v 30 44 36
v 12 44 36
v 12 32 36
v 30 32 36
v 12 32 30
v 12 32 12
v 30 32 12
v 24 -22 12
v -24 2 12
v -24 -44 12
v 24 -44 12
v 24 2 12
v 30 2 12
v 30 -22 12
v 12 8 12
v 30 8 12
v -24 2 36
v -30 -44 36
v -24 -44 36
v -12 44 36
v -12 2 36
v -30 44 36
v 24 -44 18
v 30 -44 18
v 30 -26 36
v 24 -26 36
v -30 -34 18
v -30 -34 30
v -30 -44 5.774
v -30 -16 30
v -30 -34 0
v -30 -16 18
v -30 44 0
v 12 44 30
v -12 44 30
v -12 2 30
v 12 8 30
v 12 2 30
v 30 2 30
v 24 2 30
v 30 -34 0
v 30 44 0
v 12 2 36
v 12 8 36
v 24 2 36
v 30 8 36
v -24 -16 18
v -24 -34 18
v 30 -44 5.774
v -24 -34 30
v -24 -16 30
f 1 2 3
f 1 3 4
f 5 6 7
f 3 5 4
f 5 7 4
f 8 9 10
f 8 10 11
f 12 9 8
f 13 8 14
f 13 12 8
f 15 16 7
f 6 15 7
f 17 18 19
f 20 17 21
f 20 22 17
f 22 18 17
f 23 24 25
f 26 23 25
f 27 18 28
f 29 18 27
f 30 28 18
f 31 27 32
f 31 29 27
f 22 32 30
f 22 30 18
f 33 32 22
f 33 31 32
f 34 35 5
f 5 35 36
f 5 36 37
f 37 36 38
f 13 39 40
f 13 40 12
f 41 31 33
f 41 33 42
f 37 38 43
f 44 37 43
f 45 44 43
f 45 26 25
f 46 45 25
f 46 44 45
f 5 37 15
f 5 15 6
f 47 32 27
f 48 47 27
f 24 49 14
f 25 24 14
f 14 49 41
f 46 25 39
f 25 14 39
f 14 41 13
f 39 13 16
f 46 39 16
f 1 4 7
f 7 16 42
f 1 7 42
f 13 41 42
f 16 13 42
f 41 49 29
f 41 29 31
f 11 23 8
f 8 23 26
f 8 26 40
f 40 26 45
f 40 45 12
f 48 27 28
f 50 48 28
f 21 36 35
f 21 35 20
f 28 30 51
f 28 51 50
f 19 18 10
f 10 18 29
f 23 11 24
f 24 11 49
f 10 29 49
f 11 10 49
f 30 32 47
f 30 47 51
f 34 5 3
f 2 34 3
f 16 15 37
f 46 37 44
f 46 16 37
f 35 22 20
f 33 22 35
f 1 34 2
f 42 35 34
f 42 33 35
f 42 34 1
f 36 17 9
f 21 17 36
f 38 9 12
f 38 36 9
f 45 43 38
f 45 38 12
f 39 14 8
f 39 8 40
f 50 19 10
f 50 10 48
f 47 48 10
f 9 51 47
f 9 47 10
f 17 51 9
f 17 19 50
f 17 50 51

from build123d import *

# Parameters (mm, degrees)
SKETCH_W        = 60
SKETCH_H        = 88
PAD_DEPTH       = 36
SKETCH001_W     = 48
SKETCH001_H     = 47.080017
POCKET_DEPTH    = 24
SKETCH002_W     = 24
SKETCH002_H     = 11.400024
POCKET001_DEPTH = 42.001
SKETCH003_W     = 18
SKETCH003_H     = 12
POCKET002_DEPTH = 10
POCKET003_DEPTH = 60.001
POCKET004_DEPTH = 7
POCKET005_DEPTH = 8
SKETCH007_W     = 24
SKETCH007_H     = 25.720013
POCKET006_DEPTH = 18


with BuildPart() as part:
    # Sketch → Pad (new body)
    with BuildSketch(Plane.XY):
        Rectangle(SKETCH_W, SKETCH_H)
    extrude(amount=PAD_DEPTH)

    # Sketch001 → Pocket (cut)
    with BuildSketch(Plane.XY.offset(36)):
        with Locations((0, -21.540008)):
            Rectangle(SKETCH001_W, SKETCH001_H)
    extrude(amount=-POCKET_DEPTH, mode=Mode.SUBTRACT)

    # Sketch002 → Pocket001 (cut, through all)
    with BuildSketch(Plane.XZ.offset(-2)):
        with Locations((0, 35.700012)):
            Rectangle(SKETCH002_W, SKETCH002_H)
    extrude(amount=-POCKET001_DEPTH, mode=Mode.SUBTRACT)

    # Sketch003 → Pocket002 (cut)
    with BuildSketch(Plane(origin=(-30, 0, 0), x_dir=(0, -1, 0), z_dir=(-1, 0, 0))):
        with Locations((25, 24)):
            Rectangle(SKETCH003_W, SKETCH003_H)
    extrude(amount=-POCKET002_DEPTH, mode=Mode.SUBTRACT)

    # Sketch004 → Pocket003 (cut, through all)
    with BuildSketch(Plane.YZ.offset(30)):
        Polygon((-50.809662, 9.705063), (-34, 0), (-50.809662, 0), align=None)
    extrude(amount=-POCKET003_DEPTH, mode=Mode.SUBTRACT)

    # Sketch005 → Pocket004 (cut)
    with BuildSketch(Plane.YZ.offset(30)):
        Polygon((-22, 12), (2, 30), (2, 12), align=None)
    extrude(amount=-POCKET004_DEPTH, mode=Mode.SUBTRACT)

    # Sketch006 → Pocket005 (cut)
    with BuildSketch(Plane.YZ.offset(30)):
        Polygon((-44, 36), (-44, 18), (-26, 36), align=None)
    extrude(amount=-POCKET005_DEPTH, mode=Mode.SUBTRACT)

    # Sketch007 → Pocket006 (cut)
    with BuildSketch(Plane.YZ.offset(30)):
        with Locations((20, 24.860007)):
            Rectangle(SKETCH007_W, SKETCH007_H)
    extrude(amount=-POCKET006_DEPTH, mode=Mode.SUBTRACT)


solid = part.part
